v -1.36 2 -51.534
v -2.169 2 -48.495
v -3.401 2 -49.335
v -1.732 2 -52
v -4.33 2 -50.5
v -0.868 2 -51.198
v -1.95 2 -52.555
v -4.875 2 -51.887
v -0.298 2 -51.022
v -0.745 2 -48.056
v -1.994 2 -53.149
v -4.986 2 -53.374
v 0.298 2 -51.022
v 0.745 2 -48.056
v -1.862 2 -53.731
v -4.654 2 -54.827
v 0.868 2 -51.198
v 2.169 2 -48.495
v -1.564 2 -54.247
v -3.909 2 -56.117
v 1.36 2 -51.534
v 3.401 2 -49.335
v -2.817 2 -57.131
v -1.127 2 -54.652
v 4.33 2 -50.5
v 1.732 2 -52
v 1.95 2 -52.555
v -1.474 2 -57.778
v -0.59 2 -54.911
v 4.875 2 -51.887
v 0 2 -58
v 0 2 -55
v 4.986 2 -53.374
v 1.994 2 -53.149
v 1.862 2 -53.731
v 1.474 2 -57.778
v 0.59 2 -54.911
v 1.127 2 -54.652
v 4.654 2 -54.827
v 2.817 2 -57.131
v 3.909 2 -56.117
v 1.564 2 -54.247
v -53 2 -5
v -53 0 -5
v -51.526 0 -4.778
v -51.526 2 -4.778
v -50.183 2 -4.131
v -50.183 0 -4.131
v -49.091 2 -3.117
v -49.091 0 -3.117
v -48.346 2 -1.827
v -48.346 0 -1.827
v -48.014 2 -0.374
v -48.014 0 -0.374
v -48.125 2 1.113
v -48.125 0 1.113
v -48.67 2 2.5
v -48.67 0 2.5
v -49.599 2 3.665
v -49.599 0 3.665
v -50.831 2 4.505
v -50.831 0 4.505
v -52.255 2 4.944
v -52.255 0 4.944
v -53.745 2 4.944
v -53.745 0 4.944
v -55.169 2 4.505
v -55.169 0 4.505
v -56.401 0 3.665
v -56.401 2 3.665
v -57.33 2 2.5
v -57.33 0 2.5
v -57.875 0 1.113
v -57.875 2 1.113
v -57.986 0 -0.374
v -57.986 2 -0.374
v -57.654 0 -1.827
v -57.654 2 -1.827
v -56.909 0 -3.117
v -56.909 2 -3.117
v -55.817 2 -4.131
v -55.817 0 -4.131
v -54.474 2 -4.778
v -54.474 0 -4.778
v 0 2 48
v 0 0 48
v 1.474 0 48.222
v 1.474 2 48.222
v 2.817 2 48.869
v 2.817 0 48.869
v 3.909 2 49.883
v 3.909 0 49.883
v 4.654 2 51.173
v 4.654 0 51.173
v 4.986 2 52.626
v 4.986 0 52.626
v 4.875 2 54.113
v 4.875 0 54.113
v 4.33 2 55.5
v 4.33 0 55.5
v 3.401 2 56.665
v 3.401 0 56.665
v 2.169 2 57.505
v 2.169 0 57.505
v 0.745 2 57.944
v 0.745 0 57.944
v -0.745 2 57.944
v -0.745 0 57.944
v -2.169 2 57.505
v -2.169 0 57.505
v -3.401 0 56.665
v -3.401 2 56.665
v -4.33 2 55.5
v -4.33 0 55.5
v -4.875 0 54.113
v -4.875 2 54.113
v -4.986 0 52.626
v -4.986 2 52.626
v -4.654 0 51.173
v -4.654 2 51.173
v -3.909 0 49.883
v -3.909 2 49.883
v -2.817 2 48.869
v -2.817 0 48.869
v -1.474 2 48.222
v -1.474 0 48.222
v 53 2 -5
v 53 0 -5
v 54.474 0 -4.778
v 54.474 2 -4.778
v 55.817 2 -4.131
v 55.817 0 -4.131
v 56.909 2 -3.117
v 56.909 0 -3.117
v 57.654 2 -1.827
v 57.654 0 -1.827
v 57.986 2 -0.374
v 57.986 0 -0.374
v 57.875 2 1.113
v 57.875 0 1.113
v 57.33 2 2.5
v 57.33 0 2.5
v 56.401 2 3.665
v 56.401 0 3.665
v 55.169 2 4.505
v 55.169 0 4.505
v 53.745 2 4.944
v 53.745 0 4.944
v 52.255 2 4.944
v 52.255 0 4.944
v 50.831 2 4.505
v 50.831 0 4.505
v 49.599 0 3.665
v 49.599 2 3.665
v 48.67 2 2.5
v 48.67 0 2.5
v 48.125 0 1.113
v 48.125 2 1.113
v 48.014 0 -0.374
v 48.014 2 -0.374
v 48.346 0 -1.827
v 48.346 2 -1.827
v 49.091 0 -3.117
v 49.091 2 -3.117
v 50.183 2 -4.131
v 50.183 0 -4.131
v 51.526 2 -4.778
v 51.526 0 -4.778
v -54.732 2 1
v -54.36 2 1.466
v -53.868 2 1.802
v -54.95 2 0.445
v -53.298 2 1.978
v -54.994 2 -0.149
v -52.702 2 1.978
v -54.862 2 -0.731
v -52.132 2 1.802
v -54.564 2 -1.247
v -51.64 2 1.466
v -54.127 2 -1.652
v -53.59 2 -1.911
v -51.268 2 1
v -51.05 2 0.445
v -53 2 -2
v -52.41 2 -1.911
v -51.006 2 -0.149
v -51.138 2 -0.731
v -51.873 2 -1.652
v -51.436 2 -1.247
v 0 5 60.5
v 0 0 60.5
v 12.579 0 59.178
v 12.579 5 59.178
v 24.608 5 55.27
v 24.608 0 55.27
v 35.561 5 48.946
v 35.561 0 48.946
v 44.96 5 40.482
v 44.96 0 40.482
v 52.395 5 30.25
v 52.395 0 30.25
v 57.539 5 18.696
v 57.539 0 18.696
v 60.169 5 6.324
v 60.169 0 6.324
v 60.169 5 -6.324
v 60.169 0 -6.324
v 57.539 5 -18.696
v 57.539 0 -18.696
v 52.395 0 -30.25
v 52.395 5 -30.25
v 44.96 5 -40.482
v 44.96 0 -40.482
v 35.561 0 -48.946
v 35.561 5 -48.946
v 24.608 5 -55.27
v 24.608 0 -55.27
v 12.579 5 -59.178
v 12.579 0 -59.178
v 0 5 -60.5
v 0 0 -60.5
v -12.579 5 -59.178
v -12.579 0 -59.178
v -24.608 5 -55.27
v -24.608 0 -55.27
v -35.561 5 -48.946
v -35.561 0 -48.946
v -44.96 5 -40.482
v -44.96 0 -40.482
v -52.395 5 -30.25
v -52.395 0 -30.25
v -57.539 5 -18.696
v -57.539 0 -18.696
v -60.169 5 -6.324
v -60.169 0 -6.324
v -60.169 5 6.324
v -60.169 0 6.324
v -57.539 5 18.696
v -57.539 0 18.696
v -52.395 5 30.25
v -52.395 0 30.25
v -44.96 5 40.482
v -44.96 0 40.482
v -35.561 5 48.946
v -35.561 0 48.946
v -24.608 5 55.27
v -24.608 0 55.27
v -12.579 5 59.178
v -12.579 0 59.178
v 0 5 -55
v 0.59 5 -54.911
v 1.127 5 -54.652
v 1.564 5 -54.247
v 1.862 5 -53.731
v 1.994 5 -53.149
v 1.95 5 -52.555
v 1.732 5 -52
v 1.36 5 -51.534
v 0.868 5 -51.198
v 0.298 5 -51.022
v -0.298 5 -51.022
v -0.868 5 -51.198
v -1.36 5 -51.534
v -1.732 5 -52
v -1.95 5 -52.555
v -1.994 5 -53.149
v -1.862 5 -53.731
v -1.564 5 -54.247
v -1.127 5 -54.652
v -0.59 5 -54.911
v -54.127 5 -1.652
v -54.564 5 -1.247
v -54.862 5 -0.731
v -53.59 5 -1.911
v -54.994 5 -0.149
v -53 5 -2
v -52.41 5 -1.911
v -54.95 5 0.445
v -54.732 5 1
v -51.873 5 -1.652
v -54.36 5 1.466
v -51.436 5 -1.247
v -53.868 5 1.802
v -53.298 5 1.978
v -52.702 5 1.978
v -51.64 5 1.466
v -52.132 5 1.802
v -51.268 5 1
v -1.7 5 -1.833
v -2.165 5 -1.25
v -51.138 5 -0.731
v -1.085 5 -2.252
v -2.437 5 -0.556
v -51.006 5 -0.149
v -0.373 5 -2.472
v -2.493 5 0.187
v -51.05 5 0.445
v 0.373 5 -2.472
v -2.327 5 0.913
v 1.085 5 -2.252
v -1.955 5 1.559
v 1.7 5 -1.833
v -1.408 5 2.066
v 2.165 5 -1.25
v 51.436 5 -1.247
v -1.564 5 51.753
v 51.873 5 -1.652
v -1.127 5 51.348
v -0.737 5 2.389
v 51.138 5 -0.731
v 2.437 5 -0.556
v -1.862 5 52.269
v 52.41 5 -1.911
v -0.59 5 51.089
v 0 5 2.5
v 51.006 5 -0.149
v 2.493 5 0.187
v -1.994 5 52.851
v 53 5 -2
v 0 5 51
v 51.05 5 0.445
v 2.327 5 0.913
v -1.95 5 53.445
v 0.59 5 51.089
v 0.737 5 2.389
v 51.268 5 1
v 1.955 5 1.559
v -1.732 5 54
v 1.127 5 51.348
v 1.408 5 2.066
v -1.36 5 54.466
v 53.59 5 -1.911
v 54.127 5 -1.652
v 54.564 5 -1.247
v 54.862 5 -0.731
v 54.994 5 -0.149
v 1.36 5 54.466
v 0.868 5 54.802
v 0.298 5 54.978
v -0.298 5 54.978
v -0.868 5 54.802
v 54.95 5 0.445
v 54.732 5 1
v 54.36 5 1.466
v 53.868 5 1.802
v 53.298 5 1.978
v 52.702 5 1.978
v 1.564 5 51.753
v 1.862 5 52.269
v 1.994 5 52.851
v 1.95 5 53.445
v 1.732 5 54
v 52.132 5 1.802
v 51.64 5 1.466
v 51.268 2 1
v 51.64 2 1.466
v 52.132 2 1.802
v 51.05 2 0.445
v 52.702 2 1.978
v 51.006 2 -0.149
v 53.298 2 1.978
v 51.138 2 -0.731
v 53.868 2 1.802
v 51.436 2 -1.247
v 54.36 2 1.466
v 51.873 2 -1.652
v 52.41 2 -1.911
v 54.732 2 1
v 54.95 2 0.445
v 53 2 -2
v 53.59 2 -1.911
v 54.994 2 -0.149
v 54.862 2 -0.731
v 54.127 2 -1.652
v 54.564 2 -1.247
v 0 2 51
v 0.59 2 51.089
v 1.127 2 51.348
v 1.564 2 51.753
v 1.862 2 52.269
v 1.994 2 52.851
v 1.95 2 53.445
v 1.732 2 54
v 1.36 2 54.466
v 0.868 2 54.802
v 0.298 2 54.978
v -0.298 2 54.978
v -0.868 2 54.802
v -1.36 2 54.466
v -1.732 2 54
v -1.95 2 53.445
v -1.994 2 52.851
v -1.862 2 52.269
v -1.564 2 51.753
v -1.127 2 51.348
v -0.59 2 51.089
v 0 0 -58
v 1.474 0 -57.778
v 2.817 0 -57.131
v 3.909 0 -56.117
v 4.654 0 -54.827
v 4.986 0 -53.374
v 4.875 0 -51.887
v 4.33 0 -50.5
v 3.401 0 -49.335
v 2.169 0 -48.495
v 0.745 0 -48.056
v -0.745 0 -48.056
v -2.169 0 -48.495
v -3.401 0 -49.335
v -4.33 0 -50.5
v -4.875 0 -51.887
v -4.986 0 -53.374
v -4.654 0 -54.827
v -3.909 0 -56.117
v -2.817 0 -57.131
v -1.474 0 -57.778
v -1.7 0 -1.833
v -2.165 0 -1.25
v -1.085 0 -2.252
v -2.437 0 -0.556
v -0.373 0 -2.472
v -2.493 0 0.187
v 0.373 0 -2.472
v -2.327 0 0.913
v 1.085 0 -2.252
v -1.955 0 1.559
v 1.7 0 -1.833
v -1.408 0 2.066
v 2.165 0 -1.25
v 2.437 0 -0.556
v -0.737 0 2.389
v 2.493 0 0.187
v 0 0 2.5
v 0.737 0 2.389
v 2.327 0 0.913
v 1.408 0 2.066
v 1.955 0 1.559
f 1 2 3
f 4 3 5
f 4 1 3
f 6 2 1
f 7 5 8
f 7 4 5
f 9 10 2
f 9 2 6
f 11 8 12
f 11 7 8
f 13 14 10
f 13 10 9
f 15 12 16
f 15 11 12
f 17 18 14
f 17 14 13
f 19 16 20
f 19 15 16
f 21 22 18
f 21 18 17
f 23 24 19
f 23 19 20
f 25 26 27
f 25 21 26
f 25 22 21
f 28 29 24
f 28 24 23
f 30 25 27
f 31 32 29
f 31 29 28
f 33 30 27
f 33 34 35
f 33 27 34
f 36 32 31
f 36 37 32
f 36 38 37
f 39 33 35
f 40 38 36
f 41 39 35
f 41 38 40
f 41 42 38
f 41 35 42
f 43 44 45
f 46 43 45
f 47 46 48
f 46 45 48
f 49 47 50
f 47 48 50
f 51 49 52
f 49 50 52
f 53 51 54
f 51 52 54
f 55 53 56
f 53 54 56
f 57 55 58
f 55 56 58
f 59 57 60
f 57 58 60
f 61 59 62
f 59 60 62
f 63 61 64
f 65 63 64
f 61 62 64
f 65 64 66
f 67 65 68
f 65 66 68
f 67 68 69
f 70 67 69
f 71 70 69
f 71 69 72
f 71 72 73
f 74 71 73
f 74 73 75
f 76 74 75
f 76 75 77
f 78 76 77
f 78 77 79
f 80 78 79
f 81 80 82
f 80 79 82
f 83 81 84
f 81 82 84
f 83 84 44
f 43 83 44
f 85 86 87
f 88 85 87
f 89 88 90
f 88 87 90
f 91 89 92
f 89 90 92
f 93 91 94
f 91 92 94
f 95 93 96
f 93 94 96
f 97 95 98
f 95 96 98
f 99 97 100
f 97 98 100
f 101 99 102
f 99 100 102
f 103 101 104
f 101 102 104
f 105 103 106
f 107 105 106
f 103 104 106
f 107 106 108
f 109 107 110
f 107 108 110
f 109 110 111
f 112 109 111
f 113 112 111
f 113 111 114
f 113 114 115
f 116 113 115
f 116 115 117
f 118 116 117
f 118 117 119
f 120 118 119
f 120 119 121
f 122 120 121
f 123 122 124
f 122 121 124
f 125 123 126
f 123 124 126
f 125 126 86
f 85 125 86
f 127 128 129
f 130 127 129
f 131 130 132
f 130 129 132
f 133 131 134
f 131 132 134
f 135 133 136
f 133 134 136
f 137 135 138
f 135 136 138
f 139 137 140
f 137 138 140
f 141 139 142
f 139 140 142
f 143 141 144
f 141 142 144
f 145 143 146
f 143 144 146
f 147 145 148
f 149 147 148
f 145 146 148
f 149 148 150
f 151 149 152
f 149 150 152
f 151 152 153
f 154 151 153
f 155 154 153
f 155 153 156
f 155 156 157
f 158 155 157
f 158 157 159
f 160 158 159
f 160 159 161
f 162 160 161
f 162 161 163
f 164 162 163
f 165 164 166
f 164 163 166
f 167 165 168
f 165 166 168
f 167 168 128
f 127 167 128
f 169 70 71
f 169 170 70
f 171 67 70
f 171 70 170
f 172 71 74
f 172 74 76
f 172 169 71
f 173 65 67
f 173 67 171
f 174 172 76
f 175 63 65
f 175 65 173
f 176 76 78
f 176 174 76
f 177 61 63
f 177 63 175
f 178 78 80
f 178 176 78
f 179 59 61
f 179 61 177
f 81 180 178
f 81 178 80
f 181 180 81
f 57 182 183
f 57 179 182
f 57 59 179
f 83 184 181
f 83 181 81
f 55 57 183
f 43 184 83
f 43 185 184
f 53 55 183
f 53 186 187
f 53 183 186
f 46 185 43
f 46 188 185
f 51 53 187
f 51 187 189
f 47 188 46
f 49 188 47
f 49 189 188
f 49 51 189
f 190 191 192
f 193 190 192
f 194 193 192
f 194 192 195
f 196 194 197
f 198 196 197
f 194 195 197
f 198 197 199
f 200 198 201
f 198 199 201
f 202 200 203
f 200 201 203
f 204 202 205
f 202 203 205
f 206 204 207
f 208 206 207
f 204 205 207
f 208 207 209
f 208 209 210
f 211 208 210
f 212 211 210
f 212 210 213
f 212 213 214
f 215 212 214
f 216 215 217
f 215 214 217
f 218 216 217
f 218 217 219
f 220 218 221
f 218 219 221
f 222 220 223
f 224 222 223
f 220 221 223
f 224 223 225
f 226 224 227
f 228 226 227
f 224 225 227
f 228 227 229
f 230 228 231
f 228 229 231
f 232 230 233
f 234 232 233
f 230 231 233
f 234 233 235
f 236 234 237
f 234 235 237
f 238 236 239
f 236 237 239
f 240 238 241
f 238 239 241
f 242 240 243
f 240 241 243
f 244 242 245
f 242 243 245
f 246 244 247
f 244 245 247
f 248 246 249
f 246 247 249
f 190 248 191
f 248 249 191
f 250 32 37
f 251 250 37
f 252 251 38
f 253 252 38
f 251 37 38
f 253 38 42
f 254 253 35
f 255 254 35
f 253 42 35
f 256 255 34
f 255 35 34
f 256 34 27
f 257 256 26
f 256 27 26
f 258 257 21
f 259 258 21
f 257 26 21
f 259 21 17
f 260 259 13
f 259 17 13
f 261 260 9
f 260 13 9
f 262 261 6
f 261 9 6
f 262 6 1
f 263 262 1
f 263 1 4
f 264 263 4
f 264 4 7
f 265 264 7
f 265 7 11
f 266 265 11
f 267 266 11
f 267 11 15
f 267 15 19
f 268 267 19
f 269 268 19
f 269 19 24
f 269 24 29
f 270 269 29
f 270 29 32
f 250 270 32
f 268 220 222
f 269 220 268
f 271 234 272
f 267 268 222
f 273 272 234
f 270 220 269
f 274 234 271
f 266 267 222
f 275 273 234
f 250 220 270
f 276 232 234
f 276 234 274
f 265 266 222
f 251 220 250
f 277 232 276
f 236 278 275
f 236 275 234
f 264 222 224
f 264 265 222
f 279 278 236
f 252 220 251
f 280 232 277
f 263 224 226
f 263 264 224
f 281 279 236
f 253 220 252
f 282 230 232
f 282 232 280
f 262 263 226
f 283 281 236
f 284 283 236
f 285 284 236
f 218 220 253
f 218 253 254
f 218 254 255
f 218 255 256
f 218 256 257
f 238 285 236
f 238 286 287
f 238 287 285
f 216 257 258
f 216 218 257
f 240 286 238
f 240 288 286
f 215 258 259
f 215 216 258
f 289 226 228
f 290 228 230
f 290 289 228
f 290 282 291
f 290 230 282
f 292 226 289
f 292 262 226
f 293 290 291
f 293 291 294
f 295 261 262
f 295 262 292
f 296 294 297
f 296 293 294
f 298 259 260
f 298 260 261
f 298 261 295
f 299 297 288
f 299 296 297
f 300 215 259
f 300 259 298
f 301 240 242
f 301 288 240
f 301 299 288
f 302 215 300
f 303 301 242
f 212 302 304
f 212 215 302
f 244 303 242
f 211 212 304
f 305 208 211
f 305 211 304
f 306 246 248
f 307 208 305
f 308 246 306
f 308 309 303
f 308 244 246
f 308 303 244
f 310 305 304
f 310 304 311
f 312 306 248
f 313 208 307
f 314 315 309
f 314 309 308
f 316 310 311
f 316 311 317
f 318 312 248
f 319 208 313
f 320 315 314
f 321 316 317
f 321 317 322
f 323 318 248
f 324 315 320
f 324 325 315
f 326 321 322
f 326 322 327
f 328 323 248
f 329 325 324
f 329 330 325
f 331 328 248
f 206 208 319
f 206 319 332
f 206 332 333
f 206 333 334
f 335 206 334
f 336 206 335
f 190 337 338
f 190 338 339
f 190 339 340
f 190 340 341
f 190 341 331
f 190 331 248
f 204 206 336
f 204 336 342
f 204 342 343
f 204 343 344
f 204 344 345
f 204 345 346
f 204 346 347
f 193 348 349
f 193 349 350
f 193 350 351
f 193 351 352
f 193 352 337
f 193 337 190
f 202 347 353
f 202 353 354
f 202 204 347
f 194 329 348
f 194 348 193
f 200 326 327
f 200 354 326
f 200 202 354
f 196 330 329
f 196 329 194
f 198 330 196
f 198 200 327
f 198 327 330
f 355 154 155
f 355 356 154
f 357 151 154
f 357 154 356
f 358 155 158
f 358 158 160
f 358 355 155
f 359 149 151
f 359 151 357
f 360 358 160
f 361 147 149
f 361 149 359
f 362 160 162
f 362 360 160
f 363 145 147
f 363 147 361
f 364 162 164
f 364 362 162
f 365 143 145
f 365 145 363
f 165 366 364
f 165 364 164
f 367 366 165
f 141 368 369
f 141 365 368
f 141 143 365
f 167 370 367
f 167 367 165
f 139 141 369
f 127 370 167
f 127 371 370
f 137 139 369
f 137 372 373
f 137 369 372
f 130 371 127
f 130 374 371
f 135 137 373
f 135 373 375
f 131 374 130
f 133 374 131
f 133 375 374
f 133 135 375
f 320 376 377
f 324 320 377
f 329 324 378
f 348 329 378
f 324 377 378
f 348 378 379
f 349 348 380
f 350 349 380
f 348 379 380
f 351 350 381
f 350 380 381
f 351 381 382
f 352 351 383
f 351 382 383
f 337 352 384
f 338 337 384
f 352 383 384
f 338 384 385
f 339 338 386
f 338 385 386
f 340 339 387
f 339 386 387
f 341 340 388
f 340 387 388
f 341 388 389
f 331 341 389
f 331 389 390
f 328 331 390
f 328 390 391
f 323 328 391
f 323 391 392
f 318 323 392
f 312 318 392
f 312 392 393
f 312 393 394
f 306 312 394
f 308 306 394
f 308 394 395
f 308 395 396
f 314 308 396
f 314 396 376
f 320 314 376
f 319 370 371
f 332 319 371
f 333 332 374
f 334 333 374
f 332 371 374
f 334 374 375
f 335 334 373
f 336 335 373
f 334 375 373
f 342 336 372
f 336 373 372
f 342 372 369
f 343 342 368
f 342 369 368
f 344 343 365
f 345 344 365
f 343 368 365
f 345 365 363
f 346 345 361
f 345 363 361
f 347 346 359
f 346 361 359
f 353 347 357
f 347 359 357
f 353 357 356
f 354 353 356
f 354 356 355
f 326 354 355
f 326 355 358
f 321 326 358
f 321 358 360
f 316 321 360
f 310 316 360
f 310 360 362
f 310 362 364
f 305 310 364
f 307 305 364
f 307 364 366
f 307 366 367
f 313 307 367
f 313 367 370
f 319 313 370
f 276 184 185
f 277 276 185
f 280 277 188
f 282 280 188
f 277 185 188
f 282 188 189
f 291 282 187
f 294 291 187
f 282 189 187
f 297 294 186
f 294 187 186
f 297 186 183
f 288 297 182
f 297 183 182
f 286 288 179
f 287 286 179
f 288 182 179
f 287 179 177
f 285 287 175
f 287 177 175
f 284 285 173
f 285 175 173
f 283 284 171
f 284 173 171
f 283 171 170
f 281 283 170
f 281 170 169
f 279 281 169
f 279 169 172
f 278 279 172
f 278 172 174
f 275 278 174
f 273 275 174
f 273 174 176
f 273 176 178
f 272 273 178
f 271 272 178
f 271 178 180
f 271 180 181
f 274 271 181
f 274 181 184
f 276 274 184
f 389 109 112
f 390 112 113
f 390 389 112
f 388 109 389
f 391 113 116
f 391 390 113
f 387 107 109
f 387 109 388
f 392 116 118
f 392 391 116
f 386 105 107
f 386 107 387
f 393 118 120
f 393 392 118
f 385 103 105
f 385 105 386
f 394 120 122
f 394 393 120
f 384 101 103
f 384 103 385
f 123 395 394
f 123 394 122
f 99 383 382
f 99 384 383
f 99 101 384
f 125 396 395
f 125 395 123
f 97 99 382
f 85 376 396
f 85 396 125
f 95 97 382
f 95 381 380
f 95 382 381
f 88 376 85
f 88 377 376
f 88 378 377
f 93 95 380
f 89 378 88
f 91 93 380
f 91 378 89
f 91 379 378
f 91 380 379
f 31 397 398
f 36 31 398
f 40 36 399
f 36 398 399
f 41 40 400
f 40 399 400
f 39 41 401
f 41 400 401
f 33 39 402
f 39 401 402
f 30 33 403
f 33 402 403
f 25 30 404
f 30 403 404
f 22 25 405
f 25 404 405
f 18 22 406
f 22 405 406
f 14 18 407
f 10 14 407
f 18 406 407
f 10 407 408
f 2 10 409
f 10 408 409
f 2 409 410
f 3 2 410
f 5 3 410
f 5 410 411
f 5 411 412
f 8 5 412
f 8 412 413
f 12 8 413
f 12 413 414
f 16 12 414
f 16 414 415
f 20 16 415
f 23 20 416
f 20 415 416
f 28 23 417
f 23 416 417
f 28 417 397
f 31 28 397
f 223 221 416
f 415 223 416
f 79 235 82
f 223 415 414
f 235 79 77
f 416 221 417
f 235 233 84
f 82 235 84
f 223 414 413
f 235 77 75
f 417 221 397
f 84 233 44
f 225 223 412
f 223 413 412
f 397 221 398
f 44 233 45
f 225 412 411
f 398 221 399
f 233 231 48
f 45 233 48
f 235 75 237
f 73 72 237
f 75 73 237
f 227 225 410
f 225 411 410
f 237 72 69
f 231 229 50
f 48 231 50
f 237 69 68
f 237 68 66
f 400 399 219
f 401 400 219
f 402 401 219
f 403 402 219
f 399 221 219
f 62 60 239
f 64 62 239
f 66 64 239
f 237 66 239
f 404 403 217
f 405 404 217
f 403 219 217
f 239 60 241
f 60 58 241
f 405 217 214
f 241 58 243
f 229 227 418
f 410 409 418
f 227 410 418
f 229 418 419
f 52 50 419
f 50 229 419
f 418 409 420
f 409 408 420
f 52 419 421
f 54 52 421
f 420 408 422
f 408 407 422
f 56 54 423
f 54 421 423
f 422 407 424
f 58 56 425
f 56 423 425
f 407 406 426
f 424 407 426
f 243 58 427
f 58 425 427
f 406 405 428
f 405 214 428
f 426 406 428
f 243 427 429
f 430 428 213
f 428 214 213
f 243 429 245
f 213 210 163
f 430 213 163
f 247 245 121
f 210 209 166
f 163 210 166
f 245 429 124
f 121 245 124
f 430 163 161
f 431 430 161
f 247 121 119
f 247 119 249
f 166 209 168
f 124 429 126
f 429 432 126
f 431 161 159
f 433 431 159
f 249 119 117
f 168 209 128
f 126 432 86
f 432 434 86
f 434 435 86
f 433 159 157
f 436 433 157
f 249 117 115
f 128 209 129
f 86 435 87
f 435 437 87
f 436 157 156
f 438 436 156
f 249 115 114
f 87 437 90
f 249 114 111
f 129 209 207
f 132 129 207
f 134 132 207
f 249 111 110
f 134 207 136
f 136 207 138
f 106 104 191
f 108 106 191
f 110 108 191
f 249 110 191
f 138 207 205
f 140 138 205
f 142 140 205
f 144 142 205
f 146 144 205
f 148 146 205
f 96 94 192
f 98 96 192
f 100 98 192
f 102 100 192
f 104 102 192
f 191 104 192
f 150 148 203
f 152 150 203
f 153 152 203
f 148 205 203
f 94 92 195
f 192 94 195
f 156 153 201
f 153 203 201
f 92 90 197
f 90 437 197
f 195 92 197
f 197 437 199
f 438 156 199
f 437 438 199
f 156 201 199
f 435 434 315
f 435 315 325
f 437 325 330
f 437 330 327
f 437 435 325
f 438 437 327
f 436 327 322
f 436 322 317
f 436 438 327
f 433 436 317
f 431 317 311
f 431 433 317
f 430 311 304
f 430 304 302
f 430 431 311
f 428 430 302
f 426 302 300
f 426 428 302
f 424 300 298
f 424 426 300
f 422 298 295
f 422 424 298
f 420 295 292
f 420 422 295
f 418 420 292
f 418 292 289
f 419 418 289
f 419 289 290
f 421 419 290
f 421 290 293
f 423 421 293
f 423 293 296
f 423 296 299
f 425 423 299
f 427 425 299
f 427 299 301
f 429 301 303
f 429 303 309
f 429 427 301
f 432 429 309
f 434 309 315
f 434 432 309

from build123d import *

# Parameters (mm, degrees)
SKETCH1_R           = 60.5
SKETCH1_R_2         = 2.5
BOSS_EXTRUDE1_DEPTH = 5
SKETCH2_R           = 5
CUT_EXTRUDE1_DEPTH  = 2
SKETCH4_R           = 2
CUT_EXTRUDE2_DEPTH  = 86.612499087


with BuildPart() as part:
    # Sketch1 → Boss-Extrude1 (new body)
    with BuildSketch(Plane(origin=(0, 0, 0), x_dir=(1, 0, 0), z_dir=(0, 1, 0))):
        with Locations(Location((0, 0, 0), (0, 0, 270))):
            Circle(SKETCH1_R)
        with Locations(Location((0, 0, 0), (0, 0, 270))):
            Circle(SKETCH1_R_2, mode=Mode.SUBTRACT)
    extrude(amount=BOSS_EXTRUDE1_DEPTH)

    # Sketch2 → Cut-Extrude1 (cut)
    with BuildSketch(Plane.XZ):
        with Locations(Location((0, 53, 0), (0, 0, 270))):
            Circle(SKETCH2_R)
        with Locations(Location((53, 0, 0), (0, 0, 270))):
            Circle(SKETCH2_R)
        with Locations(Location((0, -53, 0), (0, 0, 270))):
            Circle(SKETCH2_R)
        with Locations(Location((-53, 0, 0), (0, 0, 270))):
            Circle(SKETCH2_R)
    extrude(amount=-CUT_EXTRUDE1_DEPTH, mode=Mode.SUBTRACT)

    # Sketch4 → Cut-Extrude2 (cut, through all)
    with BuildSketch(Plane(origin=(0, 2, 0), x_dir=(-1, 0, 0), z_dir=(0, -1, 0))):
        with Locations(Location((0, -53, 0), (0, 0, 90))):
            Circle(SKETCH4_R)
        with Locations(Location((-53, 0, 0), (0, 0, 90))):
            Circle(SKETCH4_R)
        with Locations(Location((0, 53, 0), (0, 0, 90))):
            Circle(SKETCH4_R)
        with Locations(Location((53, 0, 0), (0, 0, 90))):
            Circle(SKETCH4_R)
    extrude(amount=-CUT_EXTRUDE2_DEPTH, mode=Mode.SUBTRACT)


solid = part.part
